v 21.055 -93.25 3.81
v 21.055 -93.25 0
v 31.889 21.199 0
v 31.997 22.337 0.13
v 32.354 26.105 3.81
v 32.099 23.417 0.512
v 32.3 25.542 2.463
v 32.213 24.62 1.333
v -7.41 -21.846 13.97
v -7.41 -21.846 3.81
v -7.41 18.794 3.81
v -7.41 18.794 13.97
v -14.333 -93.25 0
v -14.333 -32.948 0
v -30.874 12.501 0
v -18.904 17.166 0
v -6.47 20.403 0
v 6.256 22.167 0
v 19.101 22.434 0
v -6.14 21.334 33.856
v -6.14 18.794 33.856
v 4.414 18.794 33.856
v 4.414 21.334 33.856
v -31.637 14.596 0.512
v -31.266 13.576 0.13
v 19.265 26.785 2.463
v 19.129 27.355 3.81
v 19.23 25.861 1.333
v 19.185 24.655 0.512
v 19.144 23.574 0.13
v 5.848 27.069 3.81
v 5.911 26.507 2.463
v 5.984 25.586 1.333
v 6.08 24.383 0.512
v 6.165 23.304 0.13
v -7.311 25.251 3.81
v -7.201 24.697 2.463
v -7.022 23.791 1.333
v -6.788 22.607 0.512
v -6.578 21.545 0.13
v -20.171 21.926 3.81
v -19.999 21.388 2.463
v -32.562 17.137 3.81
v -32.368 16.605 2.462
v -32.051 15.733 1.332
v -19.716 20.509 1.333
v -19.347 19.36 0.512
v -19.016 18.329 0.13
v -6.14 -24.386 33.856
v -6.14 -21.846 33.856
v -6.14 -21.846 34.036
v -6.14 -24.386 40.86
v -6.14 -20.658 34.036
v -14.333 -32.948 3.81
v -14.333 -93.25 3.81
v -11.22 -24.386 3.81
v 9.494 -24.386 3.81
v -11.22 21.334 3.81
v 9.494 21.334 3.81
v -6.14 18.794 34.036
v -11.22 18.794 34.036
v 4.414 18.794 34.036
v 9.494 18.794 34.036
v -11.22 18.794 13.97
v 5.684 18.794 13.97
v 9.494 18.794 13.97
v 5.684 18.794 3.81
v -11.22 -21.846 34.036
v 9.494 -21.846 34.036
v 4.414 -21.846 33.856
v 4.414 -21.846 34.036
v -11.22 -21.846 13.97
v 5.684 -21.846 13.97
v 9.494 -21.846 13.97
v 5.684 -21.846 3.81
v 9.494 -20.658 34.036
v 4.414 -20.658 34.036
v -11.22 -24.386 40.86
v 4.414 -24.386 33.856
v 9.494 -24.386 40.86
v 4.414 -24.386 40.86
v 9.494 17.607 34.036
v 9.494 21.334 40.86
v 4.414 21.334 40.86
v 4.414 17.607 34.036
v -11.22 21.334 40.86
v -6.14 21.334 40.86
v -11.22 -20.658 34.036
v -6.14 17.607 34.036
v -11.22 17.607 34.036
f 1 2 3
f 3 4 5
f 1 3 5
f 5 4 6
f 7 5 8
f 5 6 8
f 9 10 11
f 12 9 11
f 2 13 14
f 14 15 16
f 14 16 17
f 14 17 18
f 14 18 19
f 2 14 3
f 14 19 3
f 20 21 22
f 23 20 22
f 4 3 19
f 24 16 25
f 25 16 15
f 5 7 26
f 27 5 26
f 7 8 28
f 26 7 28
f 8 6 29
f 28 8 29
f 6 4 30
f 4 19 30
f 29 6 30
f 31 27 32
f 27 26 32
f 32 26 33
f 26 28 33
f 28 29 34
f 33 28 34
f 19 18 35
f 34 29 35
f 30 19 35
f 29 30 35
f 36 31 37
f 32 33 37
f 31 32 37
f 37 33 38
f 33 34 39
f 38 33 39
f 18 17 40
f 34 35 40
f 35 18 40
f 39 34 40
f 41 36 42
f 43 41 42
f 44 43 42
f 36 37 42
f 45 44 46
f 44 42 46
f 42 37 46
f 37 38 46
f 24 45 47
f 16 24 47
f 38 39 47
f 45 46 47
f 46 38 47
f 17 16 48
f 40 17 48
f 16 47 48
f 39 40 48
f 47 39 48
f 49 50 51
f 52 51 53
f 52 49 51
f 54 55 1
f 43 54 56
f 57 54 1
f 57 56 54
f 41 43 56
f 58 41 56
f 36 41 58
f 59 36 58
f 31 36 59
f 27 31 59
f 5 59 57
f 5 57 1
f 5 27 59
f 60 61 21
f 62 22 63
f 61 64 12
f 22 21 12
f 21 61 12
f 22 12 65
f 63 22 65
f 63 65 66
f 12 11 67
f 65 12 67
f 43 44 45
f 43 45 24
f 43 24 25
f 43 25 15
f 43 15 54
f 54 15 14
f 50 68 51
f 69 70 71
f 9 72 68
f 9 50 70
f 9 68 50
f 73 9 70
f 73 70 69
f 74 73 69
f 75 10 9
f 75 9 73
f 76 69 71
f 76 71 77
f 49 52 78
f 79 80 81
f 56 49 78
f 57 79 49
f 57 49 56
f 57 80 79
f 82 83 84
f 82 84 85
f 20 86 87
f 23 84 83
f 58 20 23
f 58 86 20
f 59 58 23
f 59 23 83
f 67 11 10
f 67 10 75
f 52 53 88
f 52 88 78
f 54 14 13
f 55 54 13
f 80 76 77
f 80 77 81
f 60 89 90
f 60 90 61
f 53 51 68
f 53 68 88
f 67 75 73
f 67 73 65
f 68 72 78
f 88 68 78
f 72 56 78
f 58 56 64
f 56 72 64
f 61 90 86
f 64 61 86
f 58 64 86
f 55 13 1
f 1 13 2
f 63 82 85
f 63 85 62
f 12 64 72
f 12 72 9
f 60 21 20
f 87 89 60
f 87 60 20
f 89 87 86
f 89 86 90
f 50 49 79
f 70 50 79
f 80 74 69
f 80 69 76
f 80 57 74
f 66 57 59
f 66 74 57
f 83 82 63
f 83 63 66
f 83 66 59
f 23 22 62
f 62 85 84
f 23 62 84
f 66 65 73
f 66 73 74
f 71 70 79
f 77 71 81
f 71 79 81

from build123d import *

# Parameters (mm, degrees)
F1_DEPTH    = 3.81
F3_T2_ANGLE = 45.4323000541
F2_W        = 20.7137
F2_H        = 2.54
F4_DEPTH    = 30.226
F8_DEPTH    = 20.7137
F9_W        = 10.5537
F9_H        = 7.0042966513
F10_DEPTH   = 51.8170001
F6_W        = 3.81
F6_H        = 40.64
F11_DEPTH   = 10.16


# Not quite as in the source:
# - a fillet or chamfer that OpenCascade refuses, or shapes differently, is made with other operations: its cross-section is extruded or revolved along the edge and cut away or added


with BuildPart() as f1:
    # F0 (on Top) → F1 (new body)
    with BuildSketch(Plane.XY):
        with BuildLine():
            ThreePointArc((32.3535154368, 26.1046796118), (-0.7575616132, 26.3503201986), (-32.5620487044, 17.1373747646))
            Line((-32.5620487044, 17.1373747646), (32.3535154368, 26.1046796118))
        make_face()
        Polygon((32.3535154368, 26.1046796118), (-32.5620487044, 17.1373747646), (-14.3325939581, -32.94764052), (-14.3325939581, -93.2497044648), (21.0546860419, -93.2497044648), align=None)
    extrude(amount=F1_DEPTH)

    # F3: fillet of radius 5.08 on 1 edges, made by hand

    # F3_s1 → F3_t2 (revolve, cut)
    with BuildSketch(Plane(origin=(35.6245782938, -9.4464852648, 0), x_dir=(0, 0, 1), z_dir=(0.966594728, -0.2563096405, 0))):
        with BuildLine():
            ThreePointArc((3.81, -34.1830353327), (1.0639073716, -32.3751984564), (0, -29.2643464831))
            Line((0, -29.2643464831), (0, -34.1830353327))
            Line((0, -34.1830353327), (3.81, -34.1830353327))
        make_face()
    revolve(axis=Axis((14.9550445097, -87.395415893, 0), (0, 0, 1)), revolution_arc=F3_T2_ANGLE, mode=Mode.SUBTRACT)

    # F2 (on face) → F4 (join)
    with BuildSketch(Plane.XY.offset(3.81)):
        with Locations((-0.8633345632, 20.0644456113)):
            Rectangle(F2_W, F2_H)
        with Locations((-0.8633345632, -23.1155543887)):
            Rectangle(F2_W, F2_H)
    extrude(amount=F4_DEPTH)

    # F7 (on face) → F8 (join)
    with BuildSketch(Plane.YZ.offset(9.4935154368)):
        Polygon((-24.3855543887, 40.8603511751), (-24.3855543887, 34.036), (-21.8455543887, 34.036), (-20.6579078442, 34.036), align=None)
        Polygon((17.6067990667, 34.036), (21.3344456113, 34.036), (21.3344456113, 40.8603511751), align=None)
    extrude(amount=-F8_DEPTH)

    # F9 (on face) → F10 (cut, through all)
    with BuildSketch(Plane.XZ.offset(24.3855543887)):
        with Locations((-0.8633345632, 37.3582028494)):
            Rectangle(F9_W, F9_H)
    extrude(amount=-F10_DEPTH, mode=Mode.SUBTRACT)

    # F6 (on face) → F11 (join)
    with BuildSketch(Plane.XY.offset(3.81)):
        with Locations((7.5885154368, -1.5255543887)):
            Rectangle(F6_W, F6_H)
        with Locations((-9.3151845632, -1.5255543887)):
            Rectangle(F6_W, F6_H)
    extrude(amount=F11_DEPTH)


solid = f1.part
